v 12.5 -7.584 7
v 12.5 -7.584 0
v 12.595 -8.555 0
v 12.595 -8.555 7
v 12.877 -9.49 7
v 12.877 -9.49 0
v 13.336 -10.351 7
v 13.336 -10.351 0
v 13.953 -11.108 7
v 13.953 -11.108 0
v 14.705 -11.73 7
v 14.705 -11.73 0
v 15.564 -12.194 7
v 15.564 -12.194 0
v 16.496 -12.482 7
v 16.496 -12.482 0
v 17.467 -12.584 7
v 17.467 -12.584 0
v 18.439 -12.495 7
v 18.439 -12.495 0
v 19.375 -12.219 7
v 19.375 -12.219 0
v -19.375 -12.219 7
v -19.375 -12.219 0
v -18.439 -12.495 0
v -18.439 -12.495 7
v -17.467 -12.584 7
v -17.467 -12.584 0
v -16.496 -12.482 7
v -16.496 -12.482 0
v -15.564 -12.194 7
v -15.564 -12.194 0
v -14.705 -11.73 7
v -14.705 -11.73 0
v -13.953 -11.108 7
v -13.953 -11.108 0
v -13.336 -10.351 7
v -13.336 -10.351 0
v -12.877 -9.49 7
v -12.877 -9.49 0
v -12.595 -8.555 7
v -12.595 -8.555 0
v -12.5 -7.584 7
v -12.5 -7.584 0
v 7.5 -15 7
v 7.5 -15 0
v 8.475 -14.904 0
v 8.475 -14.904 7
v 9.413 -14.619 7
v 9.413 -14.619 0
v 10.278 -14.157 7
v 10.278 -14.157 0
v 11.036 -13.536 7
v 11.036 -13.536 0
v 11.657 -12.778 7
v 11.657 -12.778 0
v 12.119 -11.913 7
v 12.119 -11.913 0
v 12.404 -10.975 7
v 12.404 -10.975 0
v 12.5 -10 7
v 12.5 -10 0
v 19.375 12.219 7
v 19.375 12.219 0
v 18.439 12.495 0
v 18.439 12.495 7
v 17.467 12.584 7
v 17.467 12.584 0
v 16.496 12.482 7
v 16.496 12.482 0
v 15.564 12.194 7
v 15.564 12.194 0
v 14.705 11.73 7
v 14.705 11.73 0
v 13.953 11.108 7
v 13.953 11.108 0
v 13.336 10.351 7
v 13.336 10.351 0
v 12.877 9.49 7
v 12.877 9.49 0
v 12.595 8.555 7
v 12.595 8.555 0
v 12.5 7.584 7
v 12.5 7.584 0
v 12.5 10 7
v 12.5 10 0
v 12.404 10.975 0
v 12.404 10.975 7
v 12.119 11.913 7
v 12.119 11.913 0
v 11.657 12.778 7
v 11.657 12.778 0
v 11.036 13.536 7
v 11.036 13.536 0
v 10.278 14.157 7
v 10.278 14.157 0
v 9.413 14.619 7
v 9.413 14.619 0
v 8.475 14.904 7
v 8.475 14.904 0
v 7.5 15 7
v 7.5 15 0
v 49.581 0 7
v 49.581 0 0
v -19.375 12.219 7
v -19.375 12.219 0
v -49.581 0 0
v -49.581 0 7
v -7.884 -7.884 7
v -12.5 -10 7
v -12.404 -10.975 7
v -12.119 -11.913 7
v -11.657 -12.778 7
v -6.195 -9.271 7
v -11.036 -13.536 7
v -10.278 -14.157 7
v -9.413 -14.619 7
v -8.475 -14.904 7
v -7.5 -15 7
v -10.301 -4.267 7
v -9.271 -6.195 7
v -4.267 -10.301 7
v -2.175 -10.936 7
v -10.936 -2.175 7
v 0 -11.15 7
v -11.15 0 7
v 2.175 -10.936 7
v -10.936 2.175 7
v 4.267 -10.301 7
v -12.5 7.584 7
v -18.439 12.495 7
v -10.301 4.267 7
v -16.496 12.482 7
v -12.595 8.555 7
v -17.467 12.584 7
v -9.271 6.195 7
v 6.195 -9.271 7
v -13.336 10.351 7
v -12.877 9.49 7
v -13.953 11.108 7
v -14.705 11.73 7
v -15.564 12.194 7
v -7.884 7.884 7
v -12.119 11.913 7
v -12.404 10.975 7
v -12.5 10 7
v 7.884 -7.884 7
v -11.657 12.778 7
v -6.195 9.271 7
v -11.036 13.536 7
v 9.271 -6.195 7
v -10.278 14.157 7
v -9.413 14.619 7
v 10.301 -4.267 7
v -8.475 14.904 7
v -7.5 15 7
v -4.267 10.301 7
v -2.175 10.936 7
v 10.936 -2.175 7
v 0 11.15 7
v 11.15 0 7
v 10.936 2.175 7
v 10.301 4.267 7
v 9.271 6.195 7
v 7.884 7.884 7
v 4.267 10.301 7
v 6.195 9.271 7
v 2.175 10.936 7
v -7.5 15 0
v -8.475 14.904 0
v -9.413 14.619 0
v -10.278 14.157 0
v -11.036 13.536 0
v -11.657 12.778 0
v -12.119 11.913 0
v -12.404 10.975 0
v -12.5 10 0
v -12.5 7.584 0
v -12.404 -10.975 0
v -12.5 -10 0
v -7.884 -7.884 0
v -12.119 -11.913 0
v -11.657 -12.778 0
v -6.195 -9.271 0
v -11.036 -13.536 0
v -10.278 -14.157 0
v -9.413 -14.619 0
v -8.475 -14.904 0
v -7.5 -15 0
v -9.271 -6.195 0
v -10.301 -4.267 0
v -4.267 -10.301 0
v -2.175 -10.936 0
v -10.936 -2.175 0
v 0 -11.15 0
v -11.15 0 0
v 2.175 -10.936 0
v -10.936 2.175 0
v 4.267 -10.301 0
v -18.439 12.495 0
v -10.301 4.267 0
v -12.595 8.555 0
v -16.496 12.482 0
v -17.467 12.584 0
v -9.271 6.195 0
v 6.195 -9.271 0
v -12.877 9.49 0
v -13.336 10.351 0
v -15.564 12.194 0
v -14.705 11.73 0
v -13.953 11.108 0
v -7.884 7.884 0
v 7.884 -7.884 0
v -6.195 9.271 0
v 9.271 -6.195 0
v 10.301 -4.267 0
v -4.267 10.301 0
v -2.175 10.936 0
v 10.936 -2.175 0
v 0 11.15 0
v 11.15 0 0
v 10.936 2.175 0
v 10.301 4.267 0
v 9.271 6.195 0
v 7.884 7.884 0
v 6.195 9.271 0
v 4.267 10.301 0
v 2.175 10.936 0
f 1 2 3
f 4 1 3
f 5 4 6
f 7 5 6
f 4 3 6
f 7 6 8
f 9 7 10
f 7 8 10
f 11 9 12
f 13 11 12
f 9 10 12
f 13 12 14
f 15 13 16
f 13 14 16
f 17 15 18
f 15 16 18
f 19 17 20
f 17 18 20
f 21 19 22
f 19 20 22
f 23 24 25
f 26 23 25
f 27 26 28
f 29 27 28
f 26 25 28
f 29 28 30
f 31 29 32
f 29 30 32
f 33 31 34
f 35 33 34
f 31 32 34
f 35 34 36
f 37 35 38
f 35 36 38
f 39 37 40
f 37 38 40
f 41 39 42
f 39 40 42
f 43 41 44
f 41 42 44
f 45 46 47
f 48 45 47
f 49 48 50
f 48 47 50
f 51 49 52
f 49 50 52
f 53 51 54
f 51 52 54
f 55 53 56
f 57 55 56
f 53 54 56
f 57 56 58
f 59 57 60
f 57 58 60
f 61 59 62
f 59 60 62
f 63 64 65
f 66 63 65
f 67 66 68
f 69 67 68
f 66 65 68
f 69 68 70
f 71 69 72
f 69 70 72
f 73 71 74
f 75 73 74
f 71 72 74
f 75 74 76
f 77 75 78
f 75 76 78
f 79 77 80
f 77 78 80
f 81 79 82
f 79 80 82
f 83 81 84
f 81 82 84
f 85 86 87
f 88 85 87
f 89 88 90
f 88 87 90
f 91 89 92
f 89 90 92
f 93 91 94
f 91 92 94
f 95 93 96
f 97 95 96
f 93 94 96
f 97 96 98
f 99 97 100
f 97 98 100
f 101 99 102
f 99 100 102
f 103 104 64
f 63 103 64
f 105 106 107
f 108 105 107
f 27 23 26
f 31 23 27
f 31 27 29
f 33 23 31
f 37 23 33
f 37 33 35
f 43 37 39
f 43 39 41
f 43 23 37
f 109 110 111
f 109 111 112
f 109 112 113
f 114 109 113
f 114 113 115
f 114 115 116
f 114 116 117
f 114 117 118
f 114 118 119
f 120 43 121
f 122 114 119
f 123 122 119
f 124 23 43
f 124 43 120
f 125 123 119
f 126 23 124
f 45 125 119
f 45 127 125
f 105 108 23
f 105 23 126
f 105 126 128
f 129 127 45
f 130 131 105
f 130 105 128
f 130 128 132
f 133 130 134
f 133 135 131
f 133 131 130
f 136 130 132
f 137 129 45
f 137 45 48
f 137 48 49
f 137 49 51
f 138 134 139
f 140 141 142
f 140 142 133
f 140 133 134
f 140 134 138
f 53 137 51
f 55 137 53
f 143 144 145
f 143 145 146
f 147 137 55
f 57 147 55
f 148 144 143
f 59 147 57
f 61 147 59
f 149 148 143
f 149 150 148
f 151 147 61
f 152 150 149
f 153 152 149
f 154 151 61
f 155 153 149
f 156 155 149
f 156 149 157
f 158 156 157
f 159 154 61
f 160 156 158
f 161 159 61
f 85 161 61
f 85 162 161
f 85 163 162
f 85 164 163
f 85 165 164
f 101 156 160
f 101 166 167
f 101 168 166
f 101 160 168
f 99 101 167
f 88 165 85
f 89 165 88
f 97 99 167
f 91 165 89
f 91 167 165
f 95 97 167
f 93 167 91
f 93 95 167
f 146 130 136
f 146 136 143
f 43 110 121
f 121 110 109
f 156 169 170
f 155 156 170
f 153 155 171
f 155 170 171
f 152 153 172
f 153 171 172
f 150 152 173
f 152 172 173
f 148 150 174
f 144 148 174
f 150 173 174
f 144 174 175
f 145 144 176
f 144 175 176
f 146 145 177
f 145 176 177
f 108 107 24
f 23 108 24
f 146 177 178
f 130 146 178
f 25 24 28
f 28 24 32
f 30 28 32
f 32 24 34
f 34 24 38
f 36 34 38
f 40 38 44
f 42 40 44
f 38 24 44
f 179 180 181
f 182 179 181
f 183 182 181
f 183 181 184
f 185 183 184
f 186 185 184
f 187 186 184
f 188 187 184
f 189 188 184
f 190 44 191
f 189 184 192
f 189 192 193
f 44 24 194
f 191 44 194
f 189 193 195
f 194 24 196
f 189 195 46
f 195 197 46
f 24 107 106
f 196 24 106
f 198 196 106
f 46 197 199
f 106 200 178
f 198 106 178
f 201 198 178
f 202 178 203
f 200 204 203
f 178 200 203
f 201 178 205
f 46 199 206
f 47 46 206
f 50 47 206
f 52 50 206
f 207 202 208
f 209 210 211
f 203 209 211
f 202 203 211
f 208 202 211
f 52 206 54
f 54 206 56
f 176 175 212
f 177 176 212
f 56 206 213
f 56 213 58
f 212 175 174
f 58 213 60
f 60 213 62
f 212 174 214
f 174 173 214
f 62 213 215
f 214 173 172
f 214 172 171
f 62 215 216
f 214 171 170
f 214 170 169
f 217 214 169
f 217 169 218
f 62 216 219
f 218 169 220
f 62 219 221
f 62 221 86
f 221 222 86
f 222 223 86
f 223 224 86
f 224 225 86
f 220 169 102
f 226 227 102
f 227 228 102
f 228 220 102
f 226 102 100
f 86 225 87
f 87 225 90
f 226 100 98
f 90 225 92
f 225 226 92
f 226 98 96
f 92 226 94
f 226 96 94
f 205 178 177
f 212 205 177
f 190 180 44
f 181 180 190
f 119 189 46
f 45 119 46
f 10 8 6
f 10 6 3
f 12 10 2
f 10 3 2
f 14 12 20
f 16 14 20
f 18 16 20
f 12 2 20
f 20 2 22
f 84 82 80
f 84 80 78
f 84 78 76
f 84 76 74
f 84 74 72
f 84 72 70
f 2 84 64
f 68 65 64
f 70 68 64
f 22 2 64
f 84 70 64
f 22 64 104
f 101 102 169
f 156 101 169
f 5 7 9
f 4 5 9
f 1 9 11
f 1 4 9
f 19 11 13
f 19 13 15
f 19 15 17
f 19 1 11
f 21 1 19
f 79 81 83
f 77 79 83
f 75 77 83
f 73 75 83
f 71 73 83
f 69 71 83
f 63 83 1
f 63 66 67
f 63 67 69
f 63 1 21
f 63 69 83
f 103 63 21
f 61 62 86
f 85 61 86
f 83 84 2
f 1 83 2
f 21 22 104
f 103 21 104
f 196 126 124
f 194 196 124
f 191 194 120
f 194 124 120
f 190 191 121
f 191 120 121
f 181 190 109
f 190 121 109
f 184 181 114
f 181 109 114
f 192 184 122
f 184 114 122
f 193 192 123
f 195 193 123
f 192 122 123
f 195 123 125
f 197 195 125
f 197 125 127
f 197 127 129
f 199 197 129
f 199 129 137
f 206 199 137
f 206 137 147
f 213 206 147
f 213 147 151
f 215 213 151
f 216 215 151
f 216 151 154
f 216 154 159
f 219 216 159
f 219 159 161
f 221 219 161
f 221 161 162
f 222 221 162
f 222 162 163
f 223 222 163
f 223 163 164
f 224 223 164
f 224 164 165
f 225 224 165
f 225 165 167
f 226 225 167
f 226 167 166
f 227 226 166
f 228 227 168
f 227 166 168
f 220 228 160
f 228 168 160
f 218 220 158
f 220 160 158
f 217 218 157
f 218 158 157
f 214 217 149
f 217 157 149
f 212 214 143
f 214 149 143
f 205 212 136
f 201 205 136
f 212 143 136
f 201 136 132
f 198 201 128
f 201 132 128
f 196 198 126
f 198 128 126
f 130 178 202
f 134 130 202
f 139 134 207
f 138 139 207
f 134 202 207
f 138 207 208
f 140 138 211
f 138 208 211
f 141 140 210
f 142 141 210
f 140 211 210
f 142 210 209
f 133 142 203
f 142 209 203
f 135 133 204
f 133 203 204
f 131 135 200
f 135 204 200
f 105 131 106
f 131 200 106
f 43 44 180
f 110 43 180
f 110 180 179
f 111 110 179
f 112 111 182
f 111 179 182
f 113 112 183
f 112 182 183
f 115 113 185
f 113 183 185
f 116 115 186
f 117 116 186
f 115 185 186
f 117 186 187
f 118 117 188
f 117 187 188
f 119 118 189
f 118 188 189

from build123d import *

# Parameters (mm, degrees)
F3_DEPTH = 7
F4_D     = 22.3


with BuildPart() as f3:
    # F1 (on Top) → F3 (new body)
    with BuildSketch(Plane.XY):
        with BuildLine():
            ThreePointArc((12.5, 10), (11.0355339059, 13.5355339059), (7.5, 15))
            Line((7.5, 15), (-7.5, 15))
            ThreePointArc((-7.5, 15), (-11.0355339059, 13.5355339059), (-12.5, 10))
            Line((-12.5, 10), (-12.5, 7.5838015129))
            Line((-12.5, 7.5838015129), (-12.5, -7.5838015129))
            Line((-12.5, -7.5838015129), (-12.5, -10))
            ThreePointArc((-12.5, -10), (-11.0355339059, -13.5355339059), (-7.5, -15))
            Line((-7.5, -15), (7.5, -15))
            ThreePointArc((7.5, -15), (11.0355339059, -13.5355339059), (12.5, -10))
            Line((12.5, -10), (12.5, 10))
        make_face()
        with BuildLine():
            Line((-12.5, -7.5838015129), (-12.5, 7.5838015129))
            ThreePointArc((-12.5, 7.5838015129), (-14.7049150281, 11.7295825008), (-19.375, 12.2189255673))
            Line((-19.375, 12.2189255673), (-49.5809924355, 0))
            Line((-49.5809924355, 0), (-19.375, -12.2189255673))
            ThreePointArc((-19.375, -12.2189255673), (-14.7049150281, -11.7295825008), (-12.5, -7.5838015129))
        make_face()
    extrude(amount=F3_DEPTH)

    # F4 (through all)
    with Locations(Plane(origin=(0, 0, 0), x_dir=(1, 0, 0), z_dir=(0, 0, -1))):
        with Locations((0, 0)):
            Hole(F4_D / 2)


with BuildPart() as f3b:
    # F2 (on Top) → F3, piece 2 (new body)
    with BuildSketch(Plane.XY):
        with BuildLine():
            Line((12.5, 7.5838015129), (12.5, 0))
            Line((12.5, 0), (12.5, -7.5838015129))
            ThreePointArc((12.5, -7.5838015129), (14.7049150281, -11.7295825008), (19.375, -12.2189255673))
            Line((19.375, -12.2189255673), (49.5809924355, 0))
            Line((49.5809924355, 0), (19.375, 12.2189255673))
            ThreePointArc((19.375, 12.2189255673), (14.7049150281, 11.7295825008), (12.5, 7.5838015129))
        make_face()
    extrude(amount=F3_DEPTH)


solid = Compound([f3.part, f3b.part])
